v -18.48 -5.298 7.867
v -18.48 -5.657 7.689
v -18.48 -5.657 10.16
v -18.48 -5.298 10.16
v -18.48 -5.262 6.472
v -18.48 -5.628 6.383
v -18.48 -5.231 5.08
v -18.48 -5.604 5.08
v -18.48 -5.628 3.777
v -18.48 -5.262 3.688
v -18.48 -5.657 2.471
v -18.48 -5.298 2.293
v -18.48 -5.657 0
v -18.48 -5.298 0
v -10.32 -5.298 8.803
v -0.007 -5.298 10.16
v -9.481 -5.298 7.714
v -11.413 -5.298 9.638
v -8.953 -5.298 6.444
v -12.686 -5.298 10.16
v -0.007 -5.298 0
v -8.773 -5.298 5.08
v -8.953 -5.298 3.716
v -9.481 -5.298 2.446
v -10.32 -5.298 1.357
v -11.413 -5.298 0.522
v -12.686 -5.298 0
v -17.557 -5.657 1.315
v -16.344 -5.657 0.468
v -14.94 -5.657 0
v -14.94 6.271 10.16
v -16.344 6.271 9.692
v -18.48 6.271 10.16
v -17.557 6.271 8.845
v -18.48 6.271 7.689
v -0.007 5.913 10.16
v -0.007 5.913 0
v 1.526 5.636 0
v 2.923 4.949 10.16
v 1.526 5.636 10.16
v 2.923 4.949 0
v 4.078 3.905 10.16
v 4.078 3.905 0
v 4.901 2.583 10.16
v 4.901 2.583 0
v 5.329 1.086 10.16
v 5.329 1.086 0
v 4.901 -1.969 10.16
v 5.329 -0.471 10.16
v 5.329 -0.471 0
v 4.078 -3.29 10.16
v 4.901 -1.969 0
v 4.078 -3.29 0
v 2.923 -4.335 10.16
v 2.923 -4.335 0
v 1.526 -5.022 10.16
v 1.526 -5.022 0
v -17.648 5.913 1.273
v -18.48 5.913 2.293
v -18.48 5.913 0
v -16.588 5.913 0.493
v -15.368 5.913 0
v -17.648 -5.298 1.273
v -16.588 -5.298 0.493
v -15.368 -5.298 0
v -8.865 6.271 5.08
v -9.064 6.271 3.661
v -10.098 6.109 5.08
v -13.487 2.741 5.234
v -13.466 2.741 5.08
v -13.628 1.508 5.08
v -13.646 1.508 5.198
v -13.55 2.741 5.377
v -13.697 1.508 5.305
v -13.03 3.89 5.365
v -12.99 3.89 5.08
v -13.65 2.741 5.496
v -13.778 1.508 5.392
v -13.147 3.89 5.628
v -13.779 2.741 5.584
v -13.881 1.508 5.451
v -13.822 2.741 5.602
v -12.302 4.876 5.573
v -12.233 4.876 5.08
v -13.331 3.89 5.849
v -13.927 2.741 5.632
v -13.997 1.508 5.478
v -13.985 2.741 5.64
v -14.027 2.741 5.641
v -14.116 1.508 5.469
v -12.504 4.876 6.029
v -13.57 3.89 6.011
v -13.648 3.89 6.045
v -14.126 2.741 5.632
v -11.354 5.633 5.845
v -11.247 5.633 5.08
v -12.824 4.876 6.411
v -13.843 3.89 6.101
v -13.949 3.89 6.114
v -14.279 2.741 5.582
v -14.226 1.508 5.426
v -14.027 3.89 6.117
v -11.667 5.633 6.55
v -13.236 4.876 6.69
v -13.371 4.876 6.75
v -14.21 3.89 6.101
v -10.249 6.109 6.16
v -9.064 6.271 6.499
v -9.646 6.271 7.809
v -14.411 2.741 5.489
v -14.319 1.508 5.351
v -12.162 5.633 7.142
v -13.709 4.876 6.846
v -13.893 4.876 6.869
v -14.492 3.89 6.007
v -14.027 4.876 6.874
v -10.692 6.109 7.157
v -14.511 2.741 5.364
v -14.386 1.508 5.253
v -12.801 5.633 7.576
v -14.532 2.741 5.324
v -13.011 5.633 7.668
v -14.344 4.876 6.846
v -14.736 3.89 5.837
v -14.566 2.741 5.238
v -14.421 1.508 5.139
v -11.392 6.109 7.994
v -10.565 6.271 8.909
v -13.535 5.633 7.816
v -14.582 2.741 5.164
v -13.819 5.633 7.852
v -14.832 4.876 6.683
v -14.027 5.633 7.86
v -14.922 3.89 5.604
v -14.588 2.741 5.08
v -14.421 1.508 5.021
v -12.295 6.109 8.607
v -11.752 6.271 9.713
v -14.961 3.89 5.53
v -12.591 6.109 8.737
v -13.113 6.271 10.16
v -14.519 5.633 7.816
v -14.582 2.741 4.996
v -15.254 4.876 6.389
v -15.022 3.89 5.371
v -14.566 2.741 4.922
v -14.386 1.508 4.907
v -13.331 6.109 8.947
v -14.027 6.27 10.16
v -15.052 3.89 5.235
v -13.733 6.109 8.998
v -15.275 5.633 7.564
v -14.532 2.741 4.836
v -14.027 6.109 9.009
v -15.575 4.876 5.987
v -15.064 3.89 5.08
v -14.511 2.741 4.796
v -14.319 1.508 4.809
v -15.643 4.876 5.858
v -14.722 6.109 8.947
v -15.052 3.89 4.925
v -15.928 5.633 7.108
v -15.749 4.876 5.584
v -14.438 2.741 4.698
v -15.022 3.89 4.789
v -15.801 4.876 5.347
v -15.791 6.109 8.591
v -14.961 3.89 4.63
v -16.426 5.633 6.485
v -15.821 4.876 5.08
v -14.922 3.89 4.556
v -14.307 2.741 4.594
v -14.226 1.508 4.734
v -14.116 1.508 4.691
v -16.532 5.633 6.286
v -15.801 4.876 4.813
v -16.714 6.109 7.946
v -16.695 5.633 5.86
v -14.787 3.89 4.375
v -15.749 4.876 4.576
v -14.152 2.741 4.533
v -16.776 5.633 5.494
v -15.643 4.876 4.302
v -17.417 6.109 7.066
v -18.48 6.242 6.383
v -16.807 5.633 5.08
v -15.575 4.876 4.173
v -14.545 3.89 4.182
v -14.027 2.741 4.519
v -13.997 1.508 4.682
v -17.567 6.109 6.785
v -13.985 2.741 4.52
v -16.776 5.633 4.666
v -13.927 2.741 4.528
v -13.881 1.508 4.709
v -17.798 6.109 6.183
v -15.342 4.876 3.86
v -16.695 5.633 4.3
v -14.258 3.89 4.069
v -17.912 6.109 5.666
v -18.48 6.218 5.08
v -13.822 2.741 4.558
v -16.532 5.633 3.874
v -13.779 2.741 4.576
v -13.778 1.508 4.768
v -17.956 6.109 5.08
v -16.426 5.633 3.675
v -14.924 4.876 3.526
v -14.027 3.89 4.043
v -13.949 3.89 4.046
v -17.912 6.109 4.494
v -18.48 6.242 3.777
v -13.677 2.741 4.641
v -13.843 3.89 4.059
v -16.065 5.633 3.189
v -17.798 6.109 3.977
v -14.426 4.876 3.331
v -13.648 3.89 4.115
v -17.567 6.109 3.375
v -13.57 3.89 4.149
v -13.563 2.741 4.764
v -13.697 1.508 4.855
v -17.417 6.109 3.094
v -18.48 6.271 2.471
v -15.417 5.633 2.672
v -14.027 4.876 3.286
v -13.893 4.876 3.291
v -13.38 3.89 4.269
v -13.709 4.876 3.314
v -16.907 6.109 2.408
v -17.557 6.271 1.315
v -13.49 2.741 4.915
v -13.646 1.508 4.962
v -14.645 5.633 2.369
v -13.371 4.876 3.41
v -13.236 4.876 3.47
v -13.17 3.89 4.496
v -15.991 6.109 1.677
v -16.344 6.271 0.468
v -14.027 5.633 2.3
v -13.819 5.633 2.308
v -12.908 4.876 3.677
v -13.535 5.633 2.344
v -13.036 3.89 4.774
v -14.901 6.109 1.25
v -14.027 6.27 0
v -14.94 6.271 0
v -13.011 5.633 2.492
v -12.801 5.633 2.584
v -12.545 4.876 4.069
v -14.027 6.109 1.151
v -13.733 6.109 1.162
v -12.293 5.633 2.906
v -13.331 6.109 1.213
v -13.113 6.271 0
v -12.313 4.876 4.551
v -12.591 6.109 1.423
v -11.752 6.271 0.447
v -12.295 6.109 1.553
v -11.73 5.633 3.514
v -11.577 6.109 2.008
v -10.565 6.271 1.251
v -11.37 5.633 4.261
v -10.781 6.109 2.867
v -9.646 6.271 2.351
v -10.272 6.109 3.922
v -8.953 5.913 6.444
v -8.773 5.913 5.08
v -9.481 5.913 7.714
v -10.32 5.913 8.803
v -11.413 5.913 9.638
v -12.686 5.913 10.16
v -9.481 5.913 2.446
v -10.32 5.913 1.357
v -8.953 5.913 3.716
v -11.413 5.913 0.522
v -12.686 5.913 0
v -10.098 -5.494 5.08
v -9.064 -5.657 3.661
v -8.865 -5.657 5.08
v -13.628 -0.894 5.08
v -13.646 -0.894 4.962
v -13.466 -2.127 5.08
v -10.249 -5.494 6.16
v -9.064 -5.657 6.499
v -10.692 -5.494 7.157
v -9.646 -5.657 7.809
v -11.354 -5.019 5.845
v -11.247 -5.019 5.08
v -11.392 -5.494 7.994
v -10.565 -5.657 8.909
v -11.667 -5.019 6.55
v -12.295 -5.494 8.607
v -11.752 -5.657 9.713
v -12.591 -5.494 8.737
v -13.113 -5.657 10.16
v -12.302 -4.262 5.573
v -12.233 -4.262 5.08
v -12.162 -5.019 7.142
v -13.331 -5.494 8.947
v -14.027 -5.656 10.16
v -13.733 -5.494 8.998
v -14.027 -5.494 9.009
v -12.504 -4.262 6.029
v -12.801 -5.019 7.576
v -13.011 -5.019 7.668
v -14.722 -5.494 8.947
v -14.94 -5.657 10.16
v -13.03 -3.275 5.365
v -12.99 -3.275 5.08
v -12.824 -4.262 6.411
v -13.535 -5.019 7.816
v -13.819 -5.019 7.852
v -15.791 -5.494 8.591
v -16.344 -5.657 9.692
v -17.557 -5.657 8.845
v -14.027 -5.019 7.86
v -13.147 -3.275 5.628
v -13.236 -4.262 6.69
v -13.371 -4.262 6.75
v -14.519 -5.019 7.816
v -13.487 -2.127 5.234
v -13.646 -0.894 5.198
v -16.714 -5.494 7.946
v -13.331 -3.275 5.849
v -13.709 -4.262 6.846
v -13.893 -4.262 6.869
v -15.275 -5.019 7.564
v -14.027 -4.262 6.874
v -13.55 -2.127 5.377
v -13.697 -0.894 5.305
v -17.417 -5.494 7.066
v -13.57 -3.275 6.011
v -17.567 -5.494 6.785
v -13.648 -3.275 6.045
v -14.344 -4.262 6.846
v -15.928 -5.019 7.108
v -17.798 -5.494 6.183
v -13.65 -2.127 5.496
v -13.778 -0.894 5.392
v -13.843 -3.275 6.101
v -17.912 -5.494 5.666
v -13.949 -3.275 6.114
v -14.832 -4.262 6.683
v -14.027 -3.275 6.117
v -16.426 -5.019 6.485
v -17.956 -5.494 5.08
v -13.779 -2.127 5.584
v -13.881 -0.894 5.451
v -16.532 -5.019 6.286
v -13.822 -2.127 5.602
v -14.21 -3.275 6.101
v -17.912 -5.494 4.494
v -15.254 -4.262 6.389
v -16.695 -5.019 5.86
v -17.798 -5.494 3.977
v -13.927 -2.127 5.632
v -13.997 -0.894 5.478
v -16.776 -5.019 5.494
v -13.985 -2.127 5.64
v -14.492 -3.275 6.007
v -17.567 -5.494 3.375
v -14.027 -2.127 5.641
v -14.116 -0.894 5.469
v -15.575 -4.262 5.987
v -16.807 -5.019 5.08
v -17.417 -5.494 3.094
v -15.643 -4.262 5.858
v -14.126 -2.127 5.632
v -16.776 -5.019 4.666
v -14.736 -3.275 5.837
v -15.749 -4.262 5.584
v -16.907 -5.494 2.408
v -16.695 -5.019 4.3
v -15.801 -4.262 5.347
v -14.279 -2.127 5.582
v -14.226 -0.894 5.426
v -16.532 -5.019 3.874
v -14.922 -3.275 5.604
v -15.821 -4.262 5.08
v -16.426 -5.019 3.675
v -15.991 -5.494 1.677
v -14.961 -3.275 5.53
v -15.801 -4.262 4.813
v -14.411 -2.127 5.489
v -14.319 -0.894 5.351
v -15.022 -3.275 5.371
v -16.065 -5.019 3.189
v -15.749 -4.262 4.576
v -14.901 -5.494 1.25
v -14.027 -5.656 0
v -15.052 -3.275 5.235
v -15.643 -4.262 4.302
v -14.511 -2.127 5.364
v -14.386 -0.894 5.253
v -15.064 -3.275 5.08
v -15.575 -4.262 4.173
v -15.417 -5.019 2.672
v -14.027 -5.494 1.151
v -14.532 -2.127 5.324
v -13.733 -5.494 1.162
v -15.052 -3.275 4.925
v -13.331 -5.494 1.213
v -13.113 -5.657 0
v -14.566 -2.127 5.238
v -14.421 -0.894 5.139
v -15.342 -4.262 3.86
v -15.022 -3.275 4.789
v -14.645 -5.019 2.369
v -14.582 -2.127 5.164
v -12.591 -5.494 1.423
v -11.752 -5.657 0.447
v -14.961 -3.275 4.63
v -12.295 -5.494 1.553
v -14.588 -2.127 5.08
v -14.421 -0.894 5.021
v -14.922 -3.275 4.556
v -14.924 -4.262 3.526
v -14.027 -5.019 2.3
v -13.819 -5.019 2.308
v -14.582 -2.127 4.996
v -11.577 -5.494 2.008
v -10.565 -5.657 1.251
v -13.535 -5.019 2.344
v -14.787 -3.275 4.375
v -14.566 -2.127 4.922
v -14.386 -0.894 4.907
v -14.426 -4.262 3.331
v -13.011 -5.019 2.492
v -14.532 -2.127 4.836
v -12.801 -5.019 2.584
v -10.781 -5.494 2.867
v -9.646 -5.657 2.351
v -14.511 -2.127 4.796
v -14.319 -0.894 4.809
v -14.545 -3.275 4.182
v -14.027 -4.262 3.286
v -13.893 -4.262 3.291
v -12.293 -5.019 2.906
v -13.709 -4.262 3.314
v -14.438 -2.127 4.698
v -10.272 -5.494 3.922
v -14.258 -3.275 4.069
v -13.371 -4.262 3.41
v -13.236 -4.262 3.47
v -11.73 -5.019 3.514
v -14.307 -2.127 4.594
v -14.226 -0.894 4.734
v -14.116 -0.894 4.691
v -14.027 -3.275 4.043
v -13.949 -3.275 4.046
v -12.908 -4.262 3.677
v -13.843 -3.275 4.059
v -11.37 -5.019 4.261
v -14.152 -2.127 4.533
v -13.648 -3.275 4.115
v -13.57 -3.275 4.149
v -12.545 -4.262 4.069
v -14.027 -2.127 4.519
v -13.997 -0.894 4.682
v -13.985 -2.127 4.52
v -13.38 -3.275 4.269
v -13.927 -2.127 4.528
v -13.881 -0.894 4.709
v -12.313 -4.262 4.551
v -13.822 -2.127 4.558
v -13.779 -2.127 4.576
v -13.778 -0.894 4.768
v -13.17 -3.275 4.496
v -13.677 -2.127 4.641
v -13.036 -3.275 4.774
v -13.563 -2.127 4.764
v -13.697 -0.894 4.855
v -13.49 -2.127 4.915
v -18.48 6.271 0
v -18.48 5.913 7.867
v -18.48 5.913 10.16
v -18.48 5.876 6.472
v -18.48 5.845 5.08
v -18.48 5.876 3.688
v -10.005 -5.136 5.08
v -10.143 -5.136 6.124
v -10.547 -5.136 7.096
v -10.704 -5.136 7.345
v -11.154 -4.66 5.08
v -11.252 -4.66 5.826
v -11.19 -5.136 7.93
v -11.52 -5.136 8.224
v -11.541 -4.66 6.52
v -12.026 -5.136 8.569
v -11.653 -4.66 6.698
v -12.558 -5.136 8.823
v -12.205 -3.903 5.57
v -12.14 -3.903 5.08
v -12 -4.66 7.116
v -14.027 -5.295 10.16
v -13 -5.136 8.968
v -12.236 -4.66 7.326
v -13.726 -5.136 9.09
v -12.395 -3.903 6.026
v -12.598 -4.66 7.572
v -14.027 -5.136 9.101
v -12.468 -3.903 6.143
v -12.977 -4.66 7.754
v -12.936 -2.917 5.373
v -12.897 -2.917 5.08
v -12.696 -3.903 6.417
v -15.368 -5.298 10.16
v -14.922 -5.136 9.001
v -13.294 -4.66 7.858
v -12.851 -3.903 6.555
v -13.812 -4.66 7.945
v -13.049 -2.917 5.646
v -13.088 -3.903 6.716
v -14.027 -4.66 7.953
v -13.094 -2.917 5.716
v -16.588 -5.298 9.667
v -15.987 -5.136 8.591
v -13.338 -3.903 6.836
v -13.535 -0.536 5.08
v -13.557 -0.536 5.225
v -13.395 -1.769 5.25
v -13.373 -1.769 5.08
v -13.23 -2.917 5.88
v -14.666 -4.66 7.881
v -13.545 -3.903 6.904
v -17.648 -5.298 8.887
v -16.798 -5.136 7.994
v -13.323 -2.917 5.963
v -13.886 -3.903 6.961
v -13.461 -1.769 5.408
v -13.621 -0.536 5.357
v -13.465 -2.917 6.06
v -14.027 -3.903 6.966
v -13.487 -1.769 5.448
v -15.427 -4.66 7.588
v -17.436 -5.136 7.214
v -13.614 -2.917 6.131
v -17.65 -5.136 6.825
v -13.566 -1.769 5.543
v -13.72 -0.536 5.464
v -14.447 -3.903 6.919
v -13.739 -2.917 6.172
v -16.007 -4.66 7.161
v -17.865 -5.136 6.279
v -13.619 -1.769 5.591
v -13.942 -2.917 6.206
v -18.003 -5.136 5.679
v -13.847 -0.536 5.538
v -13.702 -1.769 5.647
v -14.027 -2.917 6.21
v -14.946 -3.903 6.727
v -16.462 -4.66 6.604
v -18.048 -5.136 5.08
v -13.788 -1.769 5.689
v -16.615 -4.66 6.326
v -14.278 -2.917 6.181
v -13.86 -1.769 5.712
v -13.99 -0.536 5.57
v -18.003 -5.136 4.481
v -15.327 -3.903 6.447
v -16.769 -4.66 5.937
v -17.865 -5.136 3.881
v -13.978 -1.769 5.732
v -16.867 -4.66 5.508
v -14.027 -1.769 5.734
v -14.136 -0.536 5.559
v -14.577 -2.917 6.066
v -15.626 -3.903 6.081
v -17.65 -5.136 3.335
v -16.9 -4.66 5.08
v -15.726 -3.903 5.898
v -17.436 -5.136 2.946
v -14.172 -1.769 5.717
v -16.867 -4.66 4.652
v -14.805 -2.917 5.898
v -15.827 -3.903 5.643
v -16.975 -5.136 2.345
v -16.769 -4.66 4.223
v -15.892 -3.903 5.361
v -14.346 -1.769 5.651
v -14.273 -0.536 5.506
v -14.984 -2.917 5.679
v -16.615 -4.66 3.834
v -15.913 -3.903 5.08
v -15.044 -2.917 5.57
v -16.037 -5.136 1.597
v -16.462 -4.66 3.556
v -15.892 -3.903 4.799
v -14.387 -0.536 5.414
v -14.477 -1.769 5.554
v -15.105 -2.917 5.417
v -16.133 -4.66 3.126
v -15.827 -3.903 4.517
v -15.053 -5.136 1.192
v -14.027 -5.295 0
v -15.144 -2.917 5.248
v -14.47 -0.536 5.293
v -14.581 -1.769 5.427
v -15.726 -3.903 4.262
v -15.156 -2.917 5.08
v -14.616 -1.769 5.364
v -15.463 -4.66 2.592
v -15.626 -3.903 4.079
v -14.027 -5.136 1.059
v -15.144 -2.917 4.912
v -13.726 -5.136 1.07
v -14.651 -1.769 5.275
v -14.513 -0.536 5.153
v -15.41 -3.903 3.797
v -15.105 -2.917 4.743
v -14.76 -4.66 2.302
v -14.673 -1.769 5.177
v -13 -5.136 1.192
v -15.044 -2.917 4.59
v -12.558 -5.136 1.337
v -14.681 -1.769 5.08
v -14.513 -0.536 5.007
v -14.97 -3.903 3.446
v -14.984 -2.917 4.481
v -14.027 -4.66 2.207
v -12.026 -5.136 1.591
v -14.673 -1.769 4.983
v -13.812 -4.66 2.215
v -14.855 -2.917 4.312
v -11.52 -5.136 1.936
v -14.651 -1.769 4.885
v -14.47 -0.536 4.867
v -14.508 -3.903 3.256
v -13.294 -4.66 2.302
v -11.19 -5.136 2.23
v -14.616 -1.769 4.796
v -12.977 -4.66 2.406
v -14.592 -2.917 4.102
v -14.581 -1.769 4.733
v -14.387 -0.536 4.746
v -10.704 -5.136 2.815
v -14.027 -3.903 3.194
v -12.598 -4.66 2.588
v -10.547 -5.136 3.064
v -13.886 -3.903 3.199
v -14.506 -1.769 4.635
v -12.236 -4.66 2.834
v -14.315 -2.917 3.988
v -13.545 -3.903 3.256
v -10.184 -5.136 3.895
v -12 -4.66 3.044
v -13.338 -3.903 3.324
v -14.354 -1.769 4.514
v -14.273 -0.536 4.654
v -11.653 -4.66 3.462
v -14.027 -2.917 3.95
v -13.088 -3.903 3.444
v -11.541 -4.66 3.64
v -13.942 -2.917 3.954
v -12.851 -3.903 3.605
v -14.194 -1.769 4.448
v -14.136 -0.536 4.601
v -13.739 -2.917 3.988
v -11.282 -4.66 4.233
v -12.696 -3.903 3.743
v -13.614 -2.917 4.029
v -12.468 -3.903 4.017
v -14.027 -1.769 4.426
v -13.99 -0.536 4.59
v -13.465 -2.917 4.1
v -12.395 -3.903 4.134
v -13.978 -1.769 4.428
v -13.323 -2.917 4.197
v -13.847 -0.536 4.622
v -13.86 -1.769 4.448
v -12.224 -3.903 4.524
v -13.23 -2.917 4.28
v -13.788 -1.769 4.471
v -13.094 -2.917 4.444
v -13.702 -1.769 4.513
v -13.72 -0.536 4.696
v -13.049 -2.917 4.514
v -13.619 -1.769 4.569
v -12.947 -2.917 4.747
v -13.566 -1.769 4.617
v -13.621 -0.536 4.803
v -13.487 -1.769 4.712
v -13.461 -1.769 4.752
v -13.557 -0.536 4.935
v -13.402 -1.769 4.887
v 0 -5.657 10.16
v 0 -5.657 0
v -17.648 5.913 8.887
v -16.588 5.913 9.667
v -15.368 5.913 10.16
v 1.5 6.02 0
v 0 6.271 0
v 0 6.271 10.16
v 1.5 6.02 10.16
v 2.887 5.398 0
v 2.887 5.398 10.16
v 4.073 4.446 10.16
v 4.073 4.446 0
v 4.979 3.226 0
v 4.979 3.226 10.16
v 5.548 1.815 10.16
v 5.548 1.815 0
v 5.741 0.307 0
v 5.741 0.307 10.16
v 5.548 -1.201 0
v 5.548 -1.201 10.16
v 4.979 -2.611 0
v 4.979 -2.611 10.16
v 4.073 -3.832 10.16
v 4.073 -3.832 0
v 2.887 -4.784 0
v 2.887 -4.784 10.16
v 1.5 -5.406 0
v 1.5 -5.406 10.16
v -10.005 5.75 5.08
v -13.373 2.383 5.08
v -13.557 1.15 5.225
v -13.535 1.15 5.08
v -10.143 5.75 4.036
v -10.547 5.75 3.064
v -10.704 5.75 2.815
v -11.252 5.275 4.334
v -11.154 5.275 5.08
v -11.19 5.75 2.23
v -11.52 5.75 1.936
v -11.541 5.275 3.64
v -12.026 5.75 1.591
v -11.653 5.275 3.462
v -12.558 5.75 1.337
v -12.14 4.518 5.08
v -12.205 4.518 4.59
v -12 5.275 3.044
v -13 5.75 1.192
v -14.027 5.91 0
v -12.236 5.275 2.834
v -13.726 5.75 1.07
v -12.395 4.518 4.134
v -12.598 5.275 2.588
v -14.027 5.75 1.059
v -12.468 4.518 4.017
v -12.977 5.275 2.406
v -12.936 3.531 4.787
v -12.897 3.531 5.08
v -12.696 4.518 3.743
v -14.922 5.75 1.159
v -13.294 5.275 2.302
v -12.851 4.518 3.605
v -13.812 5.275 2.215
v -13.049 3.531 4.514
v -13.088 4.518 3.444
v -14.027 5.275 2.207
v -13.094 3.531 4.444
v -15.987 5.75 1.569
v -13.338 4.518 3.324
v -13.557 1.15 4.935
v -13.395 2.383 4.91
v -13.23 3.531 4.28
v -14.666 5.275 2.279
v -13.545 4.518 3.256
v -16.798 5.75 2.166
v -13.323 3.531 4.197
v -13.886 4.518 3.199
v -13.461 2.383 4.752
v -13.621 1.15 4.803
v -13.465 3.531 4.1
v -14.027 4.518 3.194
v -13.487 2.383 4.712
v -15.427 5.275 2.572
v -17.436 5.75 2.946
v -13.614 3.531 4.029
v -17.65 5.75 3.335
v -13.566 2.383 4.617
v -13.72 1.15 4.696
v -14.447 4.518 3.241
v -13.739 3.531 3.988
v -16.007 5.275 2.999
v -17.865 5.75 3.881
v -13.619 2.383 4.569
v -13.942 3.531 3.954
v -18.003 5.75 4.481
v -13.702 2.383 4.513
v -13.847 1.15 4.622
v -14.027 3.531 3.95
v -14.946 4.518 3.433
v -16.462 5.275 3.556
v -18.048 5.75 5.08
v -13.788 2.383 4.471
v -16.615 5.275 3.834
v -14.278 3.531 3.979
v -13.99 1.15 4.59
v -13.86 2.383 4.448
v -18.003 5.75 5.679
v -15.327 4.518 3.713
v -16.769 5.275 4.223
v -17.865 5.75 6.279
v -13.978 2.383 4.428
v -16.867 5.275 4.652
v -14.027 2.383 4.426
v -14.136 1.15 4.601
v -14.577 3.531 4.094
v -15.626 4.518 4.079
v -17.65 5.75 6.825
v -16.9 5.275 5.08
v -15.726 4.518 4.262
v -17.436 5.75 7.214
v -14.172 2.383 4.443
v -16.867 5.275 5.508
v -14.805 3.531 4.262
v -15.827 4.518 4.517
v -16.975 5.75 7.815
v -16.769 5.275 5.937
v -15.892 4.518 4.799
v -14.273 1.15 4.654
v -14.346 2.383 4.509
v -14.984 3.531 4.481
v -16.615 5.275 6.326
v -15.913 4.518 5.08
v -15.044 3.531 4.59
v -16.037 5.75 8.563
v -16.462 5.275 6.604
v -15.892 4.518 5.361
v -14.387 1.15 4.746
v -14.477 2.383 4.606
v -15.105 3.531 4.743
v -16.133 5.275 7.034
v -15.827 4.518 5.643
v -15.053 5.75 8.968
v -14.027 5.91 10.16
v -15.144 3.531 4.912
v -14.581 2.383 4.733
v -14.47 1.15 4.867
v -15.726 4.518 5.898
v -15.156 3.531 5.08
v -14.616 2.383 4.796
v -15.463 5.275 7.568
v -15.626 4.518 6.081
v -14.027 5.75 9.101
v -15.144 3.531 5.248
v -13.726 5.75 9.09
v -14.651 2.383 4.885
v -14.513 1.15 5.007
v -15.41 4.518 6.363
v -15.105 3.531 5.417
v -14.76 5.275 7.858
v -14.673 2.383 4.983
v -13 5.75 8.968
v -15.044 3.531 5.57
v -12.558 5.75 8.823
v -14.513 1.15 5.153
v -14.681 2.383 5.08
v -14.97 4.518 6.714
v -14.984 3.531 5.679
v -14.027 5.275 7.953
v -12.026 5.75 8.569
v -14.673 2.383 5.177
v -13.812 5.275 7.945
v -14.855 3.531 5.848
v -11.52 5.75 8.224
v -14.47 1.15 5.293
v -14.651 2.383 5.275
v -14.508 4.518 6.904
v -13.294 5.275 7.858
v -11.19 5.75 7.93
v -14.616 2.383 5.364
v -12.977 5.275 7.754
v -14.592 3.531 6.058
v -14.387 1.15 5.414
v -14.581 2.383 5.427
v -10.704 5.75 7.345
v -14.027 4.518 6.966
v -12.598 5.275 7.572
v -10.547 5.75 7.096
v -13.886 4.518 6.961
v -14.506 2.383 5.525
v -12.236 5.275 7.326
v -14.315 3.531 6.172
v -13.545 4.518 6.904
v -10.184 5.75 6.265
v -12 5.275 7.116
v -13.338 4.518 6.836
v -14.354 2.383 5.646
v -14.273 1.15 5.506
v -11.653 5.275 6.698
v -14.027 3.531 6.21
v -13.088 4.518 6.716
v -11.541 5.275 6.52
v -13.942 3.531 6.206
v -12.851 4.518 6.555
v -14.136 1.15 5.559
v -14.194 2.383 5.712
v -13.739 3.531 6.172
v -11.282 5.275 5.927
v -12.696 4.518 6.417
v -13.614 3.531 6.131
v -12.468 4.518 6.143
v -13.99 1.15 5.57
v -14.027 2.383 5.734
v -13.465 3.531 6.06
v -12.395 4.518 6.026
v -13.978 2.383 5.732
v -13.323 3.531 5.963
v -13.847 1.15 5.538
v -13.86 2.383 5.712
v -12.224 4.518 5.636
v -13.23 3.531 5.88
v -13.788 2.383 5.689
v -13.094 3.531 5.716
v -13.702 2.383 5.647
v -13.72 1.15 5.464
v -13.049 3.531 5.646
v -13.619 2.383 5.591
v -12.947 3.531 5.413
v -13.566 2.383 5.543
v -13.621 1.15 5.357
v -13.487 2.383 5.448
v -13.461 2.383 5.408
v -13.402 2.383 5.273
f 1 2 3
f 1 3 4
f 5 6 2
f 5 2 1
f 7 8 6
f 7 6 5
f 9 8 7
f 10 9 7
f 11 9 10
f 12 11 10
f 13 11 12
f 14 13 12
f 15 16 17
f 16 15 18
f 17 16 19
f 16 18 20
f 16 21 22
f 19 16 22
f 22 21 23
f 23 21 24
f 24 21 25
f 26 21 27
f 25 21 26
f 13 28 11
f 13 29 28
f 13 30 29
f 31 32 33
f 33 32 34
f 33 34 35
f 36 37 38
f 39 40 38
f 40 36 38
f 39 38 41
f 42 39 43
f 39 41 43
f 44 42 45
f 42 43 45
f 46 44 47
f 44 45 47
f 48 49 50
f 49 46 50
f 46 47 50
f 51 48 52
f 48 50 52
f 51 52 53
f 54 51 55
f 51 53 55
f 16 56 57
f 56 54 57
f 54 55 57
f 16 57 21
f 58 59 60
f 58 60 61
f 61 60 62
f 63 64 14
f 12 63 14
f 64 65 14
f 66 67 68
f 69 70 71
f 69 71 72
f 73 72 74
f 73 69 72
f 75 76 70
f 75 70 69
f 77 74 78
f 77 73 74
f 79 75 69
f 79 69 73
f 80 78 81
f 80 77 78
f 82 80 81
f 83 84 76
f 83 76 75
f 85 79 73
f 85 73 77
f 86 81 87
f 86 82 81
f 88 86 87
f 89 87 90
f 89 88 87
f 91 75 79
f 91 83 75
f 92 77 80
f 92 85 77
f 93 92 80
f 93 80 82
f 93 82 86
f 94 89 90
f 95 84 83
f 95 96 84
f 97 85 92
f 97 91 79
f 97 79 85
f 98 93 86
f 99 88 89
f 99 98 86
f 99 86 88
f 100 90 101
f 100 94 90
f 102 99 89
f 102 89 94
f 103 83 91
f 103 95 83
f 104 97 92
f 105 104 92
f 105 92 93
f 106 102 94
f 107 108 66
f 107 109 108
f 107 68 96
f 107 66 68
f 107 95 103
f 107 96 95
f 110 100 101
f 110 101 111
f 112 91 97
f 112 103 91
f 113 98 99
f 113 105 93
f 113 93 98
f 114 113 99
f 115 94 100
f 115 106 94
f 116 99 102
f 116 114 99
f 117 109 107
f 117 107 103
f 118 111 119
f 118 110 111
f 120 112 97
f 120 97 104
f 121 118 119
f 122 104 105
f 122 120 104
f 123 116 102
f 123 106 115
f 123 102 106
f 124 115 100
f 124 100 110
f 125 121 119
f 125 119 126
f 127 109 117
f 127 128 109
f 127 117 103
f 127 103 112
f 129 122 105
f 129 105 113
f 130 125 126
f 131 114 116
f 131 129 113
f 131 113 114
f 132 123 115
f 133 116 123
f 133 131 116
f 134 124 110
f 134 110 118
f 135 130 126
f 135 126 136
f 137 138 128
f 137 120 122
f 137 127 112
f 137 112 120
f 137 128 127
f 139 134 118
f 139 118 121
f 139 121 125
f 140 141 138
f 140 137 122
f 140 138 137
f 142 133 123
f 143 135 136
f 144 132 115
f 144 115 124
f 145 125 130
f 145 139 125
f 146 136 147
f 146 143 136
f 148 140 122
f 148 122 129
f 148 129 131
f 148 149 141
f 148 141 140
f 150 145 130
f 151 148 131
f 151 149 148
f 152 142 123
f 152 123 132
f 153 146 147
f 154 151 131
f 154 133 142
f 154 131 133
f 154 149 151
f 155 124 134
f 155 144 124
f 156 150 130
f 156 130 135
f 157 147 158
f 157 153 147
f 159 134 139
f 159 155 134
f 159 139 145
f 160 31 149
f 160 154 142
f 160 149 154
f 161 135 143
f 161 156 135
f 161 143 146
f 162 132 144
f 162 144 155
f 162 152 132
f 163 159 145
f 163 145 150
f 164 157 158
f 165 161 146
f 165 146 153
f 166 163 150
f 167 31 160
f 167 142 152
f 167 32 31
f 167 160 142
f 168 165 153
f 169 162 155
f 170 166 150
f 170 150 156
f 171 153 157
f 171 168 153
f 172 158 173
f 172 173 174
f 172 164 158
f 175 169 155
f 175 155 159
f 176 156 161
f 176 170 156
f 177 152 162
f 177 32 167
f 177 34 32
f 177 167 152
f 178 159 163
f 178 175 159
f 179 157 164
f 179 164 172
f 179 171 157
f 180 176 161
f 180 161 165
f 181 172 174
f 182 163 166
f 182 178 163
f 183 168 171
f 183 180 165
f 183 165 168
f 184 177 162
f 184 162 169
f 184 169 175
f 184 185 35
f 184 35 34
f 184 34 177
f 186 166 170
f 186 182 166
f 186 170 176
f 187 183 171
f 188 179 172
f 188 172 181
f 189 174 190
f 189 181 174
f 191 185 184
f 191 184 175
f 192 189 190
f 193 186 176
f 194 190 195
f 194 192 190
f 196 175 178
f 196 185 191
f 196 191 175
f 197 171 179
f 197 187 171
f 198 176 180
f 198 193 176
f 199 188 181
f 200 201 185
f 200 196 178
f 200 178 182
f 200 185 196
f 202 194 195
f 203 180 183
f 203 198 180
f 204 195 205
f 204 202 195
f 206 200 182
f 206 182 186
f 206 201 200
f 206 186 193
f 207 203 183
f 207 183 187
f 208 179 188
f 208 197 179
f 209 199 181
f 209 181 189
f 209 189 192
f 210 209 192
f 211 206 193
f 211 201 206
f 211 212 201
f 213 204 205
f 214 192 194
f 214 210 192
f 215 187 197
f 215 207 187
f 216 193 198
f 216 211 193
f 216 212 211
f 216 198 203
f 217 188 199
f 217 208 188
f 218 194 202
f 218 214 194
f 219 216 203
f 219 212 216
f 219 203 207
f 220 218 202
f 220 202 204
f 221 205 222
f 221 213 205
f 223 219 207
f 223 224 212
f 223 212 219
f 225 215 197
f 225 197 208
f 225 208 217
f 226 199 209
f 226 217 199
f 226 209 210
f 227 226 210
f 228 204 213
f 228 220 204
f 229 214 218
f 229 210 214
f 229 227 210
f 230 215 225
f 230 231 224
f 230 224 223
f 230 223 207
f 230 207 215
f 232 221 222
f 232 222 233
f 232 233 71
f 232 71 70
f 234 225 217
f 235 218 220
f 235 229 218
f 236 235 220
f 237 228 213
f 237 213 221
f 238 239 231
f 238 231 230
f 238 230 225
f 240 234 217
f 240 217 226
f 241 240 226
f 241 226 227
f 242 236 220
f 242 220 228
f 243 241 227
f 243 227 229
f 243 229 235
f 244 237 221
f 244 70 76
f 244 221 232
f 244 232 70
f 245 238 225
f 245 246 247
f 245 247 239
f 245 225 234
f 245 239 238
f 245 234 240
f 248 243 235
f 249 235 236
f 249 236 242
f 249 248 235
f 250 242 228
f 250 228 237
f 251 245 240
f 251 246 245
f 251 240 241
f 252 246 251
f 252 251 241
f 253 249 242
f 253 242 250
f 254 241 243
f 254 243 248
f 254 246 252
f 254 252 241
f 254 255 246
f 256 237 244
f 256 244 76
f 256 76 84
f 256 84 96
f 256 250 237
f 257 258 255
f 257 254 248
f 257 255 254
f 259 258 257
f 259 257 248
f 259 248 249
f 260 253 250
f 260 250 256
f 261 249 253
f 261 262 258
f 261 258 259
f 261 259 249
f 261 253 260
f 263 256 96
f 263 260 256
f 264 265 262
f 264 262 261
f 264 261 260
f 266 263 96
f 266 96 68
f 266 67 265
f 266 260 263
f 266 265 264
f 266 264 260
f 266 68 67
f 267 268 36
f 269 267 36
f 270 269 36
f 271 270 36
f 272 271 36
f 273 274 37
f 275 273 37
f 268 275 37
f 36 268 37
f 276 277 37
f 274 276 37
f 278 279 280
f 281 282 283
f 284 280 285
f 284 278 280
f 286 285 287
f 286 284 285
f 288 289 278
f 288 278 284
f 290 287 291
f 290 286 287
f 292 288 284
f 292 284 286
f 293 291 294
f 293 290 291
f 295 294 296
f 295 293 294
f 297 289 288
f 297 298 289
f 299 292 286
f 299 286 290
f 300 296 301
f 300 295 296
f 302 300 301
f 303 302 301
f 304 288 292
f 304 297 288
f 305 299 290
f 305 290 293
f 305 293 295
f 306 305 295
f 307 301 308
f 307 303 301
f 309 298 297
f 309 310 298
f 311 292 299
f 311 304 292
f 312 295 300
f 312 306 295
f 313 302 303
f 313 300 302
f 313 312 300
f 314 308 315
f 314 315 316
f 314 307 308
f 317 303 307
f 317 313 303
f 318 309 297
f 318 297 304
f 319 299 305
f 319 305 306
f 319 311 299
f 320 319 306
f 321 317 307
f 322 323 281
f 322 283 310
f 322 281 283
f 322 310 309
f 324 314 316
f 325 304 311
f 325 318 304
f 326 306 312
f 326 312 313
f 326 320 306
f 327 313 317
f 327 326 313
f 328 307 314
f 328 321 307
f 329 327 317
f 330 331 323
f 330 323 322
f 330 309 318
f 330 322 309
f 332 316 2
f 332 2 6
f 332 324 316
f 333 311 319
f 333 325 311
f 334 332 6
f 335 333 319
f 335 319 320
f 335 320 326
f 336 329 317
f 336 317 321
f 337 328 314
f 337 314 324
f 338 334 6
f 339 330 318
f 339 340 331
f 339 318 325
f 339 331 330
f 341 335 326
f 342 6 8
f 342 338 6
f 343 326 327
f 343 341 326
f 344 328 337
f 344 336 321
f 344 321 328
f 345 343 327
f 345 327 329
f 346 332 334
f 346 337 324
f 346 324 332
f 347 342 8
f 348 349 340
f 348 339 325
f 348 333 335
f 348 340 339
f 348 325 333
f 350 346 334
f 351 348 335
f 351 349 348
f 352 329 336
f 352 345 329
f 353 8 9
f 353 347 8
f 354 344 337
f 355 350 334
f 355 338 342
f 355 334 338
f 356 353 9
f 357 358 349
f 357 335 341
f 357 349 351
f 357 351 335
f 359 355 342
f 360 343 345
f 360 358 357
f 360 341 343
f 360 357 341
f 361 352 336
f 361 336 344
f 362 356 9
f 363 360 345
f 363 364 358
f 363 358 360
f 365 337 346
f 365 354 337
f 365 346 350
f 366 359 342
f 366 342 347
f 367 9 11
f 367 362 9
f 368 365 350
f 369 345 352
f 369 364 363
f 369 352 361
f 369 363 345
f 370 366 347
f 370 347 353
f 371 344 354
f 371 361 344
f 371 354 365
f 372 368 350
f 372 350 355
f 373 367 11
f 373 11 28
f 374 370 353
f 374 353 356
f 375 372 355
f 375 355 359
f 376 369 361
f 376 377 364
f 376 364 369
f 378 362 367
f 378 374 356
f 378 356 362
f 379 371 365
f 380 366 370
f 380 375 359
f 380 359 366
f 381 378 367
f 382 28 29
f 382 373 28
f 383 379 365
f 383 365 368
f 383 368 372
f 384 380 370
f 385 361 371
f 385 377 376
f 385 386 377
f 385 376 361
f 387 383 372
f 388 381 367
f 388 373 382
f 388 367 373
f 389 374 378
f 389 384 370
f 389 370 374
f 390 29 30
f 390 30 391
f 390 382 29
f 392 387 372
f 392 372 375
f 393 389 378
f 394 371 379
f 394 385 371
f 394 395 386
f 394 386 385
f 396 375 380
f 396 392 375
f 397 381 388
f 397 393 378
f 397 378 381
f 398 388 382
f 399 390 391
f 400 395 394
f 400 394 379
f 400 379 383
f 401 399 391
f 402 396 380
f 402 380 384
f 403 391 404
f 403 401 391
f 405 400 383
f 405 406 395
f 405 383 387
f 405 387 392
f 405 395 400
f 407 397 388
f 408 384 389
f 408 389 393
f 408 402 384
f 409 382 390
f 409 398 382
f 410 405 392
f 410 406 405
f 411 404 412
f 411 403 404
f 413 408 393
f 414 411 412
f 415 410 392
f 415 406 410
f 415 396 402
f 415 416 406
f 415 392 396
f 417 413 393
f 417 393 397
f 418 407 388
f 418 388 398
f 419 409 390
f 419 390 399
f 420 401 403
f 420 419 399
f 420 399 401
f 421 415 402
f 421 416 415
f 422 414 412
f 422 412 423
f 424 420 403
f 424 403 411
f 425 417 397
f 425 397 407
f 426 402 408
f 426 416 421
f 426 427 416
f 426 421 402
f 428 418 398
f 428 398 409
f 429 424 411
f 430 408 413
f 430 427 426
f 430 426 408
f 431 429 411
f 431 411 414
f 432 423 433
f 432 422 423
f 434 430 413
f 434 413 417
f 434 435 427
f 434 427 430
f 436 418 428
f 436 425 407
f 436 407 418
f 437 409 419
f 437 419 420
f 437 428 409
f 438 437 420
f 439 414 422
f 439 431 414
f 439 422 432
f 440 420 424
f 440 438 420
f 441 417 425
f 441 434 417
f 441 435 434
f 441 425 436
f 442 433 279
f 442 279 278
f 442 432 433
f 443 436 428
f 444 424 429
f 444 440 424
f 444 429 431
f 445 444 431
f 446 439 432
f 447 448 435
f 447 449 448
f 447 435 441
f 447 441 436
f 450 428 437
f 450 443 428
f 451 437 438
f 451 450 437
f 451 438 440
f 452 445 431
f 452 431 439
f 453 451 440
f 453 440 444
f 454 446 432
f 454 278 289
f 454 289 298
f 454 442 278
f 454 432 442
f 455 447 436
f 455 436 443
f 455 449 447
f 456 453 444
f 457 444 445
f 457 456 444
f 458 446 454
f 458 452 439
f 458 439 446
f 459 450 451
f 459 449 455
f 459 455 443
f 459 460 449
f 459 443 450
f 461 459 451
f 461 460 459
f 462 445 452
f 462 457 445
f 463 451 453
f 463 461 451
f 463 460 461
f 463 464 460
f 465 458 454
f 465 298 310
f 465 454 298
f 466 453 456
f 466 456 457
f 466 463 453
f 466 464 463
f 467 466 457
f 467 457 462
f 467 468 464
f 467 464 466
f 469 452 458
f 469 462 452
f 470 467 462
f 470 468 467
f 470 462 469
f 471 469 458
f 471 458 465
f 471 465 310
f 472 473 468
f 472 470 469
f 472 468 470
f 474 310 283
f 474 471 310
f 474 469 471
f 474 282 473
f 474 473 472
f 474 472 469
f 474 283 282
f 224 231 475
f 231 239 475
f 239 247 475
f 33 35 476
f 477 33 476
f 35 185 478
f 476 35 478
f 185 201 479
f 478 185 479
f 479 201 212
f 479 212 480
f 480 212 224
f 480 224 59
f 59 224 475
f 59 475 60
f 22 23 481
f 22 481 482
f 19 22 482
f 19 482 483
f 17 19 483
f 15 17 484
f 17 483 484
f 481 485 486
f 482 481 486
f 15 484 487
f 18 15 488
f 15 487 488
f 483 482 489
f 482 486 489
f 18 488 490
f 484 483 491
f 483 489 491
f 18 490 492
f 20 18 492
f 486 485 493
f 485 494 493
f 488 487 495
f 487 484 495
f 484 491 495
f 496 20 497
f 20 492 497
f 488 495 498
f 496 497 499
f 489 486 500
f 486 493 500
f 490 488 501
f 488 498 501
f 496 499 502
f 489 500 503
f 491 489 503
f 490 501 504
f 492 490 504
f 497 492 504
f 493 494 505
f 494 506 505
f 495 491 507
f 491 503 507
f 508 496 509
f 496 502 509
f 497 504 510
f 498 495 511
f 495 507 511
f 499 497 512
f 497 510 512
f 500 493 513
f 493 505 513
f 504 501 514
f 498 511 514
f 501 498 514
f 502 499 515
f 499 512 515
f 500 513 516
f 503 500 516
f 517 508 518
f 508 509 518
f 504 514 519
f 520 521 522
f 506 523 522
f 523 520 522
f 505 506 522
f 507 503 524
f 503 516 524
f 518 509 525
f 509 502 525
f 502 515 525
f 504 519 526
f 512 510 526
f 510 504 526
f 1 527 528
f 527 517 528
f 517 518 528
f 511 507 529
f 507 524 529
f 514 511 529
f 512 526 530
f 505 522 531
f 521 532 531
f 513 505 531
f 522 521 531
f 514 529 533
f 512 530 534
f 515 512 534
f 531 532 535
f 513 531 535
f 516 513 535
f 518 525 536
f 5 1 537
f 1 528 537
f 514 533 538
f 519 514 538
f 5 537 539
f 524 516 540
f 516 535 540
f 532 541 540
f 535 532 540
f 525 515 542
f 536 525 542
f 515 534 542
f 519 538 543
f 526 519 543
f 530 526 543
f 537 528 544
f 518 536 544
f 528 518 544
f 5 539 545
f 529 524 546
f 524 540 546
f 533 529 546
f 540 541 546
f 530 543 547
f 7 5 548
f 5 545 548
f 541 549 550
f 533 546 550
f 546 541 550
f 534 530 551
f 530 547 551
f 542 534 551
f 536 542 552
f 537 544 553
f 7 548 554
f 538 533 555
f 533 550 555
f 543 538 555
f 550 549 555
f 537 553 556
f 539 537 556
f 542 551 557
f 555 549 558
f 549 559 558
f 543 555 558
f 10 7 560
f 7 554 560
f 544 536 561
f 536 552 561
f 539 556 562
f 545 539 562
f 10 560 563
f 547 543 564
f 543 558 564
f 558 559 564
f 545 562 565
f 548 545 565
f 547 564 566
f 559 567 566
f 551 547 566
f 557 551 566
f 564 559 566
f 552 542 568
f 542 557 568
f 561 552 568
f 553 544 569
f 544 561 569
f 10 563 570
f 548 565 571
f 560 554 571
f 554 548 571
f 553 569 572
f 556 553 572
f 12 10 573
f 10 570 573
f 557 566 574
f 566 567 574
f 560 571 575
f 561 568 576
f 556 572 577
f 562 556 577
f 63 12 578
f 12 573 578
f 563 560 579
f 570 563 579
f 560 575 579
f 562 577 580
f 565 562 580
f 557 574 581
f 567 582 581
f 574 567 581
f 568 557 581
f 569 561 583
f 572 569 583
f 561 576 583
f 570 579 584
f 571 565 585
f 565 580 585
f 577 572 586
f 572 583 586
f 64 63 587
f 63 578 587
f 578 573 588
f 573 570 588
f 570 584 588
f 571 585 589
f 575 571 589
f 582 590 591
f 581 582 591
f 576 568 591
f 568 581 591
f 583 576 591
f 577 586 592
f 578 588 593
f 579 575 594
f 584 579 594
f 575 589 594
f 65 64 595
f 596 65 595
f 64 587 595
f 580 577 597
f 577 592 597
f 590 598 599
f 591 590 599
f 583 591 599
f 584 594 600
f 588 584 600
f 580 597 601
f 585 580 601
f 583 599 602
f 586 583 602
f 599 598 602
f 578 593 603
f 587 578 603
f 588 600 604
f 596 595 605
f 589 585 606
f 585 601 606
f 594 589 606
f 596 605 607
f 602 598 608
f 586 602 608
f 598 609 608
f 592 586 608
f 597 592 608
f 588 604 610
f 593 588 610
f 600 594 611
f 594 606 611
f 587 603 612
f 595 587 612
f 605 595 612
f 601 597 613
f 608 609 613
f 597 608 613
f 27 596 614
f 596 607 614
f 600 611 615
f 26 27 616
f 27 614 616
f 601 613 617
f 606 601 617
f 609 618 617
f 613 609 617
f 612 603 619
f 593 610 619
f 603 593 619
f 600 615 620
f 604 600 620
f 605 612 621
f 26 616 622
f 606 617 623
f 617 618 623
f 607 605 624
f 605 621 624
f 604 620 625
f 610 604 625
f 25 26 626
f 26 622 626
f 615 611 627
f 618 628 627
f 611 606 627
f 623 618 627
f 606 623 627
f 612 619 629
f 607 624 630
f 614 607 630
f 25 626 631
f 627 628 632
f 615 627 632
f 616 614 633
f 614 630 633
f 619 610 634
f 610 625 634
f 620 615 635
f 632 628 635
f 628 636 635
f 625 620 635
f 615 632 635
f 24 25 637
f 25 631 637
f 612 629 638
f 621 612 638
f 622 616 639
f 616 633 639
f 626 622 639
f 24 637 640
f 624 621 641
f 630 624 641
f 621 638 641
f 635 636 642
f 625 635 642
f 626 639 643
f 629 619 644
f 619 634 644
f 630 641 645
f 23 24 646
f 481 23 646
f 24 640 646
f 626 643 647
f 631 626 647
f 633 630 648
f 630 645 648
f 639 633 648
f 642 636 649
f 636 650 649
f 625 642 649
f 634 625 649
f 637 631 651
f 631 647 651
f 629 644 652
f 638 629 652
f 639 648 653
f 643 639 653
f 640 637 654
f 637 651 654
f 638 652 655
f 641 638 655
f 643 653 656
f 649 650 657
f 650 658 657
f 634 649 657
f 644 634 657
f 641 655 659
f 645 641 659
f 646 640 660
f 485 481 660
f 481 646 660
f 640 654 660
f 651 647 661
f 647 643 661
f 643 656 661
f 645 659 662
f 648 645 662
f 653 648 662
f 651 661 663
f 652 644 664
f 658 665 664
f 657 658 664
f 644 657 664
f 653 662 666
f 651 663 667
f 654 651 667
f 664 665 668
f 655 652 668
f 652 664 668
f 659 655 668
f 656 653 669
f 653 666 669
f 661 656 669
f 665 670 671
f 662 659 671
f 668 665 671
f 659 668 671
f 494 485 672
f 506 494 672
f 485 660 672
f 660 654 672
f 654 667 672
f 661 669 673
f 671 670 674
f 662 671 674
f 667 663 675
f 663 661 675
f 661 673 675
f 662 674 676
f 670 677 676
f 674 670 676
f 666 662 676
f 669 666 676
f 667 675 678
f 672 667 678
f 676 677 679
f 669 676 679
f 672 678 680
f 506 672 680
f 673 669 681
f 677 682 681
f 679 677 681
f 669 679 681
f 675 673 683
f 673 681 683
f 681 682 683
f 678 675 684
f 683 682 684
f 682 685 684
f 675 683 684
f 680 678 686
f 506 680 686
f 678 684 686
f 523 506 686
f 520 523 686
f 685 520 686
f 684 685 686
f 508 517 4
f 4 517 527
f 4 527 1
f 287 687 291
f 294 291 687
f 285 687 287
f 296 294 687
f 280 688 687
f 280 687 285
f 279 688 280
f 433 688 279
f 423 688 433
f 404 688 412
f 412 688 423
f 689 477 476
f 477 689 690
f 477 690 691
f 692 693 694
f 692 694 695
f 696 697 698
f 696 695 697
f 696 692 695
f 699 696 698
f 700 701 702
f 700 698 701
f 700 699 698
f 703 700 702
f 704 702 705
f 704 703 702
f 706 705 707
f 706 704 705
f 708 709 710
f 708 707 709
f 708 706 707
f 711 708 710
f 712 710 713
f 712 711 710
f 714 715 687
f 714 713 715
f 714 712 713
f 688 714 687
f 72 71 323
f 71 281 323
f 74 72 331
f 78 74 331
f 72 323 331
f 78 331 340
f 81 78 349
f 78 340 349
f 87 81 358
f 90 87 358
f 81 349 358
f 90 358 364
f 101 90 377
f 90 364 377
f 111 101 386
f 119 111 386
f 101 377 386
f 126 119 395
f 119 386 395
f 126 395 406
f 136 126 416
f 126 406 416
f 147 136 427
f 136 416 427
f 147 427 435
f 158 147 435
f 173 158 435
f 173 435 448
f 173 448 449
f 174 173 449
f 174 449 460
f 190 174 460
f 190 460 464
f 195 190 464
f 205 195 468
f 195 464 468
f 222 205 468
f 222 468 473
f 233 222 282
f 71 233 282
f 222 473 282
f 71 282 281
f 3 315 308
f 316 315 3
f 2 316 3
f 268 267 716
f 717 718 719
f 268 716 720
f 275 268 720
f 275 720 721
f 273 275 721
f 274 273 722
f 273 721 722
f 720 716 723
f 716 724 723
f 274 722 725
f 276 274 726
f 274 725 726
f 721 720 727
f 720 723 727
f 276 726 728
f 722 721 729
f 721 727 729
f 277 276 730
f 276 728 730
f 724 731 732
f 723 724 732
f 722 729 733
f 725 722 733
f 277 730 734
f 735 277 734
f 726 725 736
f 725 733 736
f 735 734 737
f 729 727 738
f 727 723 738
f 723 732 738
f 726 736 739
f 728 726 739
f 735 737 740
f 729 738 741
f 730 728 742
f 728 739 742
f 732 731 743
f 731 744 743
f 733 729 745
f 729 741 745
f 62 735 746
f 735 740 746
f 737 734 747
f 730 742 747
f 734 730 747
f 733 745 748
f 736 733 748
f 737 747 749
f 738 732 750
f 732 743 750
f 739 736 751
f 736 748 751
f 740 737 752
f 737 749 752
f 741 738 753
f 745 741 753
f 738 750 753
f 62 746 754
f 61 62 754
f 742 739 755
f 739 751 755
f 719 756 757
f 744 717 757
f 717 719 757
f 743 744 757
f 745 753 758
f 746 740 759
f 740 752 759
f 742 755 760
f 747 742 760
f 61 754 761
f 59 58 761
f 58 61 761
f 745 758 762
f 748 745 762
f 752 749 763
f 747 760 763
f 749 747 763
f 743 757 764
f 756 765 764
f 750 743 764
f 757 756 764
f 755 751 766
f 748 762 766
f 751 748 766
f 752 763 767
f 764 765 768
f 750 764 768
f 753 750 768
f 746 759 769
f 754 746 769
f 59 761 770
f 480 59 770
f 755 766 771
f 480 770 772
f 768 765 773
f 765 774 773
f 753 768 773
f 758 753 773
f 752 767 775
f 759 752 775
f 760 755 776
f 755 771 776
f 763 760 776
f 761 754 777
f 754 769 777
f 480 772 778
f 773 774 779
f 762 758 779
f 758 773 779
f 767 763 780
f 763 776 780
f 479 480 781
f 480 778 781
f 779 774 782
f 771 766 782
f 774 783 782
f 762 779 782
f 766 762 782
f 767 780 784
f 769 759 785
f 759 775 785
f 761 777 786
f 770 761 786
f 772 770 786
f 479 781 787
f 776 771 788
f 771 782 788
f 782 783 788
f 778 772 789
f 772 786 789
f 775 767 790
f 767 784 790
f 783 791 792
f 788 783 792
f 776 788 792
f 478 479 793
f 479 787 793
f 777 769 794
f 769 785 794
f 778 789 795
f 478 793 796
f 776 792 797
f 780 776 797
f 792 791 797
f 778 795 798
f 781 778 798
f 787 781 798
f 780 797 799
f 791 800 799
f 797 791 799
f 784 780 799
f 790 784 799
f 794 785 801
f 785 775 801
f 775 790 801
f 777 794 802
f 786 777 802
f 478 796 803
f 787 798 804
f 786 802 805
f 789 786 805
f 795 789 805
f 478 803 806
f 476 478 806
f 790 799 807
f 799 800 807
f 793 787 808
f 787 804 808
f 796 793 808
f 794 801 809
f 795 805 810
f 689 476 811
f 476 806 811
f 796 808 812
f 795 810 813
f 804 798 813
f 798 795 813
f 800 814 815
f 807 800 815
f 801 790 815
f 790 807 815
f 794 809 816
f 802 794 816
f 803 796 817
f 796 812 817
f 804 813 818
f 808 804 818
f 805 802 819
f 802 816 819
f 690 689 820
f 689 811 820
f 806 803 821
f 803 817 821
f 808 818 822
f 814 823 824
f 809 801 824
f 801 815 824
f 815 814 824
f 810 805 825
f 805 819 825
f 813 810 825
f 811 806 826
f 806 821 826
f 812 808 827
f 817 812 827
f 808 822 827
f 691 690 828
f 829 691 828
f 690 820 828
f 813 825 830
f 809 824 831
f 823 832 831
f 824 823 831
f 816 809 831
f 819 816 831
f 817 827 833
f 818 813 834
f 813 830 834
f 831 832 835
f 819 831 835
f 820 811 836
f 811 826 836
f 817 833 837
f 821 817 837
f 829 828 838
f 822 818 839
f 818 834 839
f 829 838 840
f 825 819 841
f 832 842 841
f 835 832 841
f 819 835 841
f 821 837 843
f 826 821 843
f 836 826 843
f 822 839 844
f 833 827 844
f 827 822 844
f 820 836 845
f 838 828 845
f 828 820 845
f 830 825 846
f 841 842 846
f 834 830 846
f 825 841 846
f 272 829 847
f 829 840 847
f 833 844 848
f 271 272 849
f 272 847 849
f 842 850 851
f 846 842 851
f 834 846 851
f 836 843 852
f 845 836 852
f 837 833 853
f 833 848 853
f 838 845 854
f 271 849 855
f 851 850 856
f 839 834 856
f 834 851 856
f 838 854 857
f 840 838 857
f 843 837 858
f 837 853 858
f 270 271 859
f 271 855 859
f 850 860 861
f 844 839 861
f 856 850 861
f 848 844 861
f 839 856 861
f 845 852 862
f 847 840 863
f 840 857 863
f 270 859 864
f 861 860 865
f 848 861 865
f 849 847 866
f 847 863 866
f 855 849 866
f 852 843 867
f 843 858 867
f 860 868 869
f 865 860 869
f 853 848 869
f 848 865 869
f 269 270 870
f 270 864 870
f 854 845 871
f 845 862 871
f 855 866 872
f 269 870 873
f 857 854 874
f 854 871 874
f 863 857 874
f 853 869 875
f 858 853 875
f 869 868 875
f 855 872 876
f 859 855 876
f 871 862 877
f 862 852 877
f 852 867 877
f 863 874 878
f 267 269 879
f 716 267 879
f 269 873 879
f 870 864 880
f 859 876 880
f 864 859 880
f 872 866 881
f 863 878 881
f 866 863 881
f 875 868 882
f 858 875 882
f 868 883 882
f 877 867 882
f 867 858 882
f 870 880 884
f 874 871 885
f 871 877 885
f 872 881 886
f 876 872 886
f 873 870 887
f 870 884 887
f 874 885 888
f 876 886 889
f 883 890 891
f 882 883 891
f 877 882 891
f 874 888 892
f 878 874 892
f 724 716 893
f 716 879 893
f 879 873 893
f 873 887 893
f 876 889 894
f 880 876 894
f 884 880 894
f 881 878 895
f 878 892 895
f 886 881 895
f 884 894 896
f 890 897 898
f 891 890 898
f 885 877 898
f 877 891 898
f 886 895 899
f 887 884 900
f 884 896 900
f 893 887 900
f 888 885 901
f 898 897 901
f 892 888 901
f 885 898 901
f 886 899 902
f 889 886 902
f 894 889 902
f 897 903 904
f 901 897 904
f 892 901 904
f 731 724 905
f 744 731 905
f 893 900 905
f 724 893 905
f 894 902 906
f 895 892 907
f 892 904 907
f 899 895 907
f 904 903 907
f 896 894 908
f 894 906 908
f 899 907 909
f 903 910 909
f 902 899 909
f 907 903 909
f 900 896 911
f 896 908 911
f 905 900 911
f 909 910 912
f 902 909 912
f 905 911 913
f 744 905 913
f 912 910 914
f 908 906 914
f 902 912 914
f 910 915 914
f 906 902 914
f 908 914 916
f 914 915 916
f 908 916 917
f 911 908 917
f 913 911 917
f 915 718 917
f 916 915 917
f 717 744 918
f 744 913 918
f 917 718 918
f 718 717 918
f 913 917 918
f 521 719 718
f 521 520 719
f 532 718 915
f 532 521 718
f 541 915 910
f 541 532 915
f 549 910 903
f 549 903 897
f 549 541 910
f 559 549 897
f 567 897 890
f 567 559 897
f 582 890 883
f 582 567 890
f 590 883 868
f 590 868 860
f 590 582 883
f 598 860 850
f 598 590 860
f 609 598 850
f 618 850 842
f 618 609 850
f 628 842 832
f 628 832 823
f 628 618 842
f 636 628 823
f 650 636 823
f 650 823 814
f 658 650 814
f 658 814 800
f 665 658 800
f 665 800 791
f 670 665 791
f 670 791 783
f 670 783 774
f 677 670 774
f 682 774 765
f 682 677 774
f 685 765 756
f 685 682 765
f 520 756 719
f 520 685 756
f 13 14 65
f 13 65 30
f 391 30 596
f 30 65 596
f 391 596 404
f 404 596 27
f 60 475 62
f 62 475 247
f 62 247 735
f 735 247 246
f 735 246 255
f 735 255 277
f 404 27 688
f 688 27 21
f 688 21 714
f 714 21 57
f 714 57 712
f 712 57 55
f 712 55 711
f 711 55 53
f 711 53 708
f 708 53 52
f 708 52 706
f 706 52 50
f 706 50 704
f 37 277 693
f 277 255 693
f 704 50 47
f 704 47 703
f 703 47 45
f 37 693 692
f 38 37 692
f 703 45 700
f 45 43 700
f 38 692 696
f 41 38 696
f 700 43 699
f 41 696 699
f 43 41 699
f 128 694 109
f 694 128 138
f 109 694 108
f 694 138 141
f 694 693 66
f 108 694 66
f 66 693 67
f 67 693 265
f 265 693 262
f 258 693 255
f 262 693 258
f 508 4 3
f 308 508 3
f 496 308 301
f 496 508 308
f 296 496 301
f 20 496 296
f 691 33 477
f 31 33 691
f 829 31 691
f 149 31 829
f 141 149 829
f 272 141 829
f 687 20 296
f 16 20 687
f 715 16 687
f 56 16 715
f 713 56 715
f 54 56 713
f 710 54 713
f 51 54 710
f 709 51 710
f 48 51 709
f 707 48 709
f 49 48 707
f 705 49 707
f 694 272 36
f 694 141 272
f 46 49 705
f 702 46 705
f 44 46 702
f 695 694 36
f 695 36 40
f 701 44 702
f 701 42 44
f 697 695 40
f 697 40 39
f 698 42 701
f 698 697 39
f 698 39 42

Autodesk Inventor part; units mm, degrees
ref_plane "YZ Plane" through (0, 0, 0) normal (1, 0, 0) x (0, 1, 0)
ref_plane "XZ Plane" through (0, 0, 0) normal (0, 1, 0) x (-1, 0, 0)
ref_plane "XY Plane" through (0, 0, 0) normal (0, 0, 1) x (1, 0, 0)
sketch "Sketch1" plane through (0, 0, 0) normal (0, 0, 1) x (1, 0, 0)
  arc A0 (0, -5.6567) -> (0, 6.271) centre (-0.2268, 0.3072) ccw
  line L0 (0, 6.271) -> (-18.4804, 6.271)
  line L1 (0, -5.6567) -> (-18.4804, -5.6567)
  line L2 (-18.122, 5.9127) -> (-0.0069, 5.9127)
  arc A1 (-0.0069, -5.2984) -> (-0.0069, 5.9127) centre (-0.2268, 0.3072) ccw
  line L3 (-0.0069, -5.2984) -> (-18.122, -5.2984)
  line L4 (-18.122, 5.9127) -> (-18.4804, 5.9127)
  line L5 (-18.4804, 6.271) -> (-18.4804, 5.9127)
  line L6 (-18.122, -5.2984) -> (-18.4804, -5.2984)
  line L7 (-18.4804, -5.6567) -> (-18.4804, -5.2984)
  point P0 (0, 0)
extrude "Extrusion1" add sketch "Sketch1" along normal blind 10.16
sketch "Sketch2" plane through (-18.4804, -5.2984, 0) normal (0, 1, 0) x (1, 0, 0)
  circle A0 centre (4.4536, -5.08) radius 0.4915
  point P0 (18.4804, 0)
extrude "Extrusion2" add sketch "Sketch2" along normal blind 11.43
fillet "Fillet1" radius 4.7625 1 edges at (-14.5182, -5.2984, 5.08)
fillet "Fillet2" radius 4.7625 1 edges at (-14.5182, 5.9127, 5.08)
sketch "Sketch3" plane through (-18.4804, -5.6567, 0) normal (0, -1, 0) x (1, 0, 0)
  circle A0 centre (4.4536, 5.08) radius 0.399
extrude "Extrusion3" cut sketch "Sketch3" against normal blind 25.4
fillet "Fillet3" radius 4.7625 1 edges at (-14.4258, 6.271, 5.08)
fillet "Fillet4" radius 4.7625 1 edges at (-14.4258, -5.6567, 5.08)
properties part number "space time"
